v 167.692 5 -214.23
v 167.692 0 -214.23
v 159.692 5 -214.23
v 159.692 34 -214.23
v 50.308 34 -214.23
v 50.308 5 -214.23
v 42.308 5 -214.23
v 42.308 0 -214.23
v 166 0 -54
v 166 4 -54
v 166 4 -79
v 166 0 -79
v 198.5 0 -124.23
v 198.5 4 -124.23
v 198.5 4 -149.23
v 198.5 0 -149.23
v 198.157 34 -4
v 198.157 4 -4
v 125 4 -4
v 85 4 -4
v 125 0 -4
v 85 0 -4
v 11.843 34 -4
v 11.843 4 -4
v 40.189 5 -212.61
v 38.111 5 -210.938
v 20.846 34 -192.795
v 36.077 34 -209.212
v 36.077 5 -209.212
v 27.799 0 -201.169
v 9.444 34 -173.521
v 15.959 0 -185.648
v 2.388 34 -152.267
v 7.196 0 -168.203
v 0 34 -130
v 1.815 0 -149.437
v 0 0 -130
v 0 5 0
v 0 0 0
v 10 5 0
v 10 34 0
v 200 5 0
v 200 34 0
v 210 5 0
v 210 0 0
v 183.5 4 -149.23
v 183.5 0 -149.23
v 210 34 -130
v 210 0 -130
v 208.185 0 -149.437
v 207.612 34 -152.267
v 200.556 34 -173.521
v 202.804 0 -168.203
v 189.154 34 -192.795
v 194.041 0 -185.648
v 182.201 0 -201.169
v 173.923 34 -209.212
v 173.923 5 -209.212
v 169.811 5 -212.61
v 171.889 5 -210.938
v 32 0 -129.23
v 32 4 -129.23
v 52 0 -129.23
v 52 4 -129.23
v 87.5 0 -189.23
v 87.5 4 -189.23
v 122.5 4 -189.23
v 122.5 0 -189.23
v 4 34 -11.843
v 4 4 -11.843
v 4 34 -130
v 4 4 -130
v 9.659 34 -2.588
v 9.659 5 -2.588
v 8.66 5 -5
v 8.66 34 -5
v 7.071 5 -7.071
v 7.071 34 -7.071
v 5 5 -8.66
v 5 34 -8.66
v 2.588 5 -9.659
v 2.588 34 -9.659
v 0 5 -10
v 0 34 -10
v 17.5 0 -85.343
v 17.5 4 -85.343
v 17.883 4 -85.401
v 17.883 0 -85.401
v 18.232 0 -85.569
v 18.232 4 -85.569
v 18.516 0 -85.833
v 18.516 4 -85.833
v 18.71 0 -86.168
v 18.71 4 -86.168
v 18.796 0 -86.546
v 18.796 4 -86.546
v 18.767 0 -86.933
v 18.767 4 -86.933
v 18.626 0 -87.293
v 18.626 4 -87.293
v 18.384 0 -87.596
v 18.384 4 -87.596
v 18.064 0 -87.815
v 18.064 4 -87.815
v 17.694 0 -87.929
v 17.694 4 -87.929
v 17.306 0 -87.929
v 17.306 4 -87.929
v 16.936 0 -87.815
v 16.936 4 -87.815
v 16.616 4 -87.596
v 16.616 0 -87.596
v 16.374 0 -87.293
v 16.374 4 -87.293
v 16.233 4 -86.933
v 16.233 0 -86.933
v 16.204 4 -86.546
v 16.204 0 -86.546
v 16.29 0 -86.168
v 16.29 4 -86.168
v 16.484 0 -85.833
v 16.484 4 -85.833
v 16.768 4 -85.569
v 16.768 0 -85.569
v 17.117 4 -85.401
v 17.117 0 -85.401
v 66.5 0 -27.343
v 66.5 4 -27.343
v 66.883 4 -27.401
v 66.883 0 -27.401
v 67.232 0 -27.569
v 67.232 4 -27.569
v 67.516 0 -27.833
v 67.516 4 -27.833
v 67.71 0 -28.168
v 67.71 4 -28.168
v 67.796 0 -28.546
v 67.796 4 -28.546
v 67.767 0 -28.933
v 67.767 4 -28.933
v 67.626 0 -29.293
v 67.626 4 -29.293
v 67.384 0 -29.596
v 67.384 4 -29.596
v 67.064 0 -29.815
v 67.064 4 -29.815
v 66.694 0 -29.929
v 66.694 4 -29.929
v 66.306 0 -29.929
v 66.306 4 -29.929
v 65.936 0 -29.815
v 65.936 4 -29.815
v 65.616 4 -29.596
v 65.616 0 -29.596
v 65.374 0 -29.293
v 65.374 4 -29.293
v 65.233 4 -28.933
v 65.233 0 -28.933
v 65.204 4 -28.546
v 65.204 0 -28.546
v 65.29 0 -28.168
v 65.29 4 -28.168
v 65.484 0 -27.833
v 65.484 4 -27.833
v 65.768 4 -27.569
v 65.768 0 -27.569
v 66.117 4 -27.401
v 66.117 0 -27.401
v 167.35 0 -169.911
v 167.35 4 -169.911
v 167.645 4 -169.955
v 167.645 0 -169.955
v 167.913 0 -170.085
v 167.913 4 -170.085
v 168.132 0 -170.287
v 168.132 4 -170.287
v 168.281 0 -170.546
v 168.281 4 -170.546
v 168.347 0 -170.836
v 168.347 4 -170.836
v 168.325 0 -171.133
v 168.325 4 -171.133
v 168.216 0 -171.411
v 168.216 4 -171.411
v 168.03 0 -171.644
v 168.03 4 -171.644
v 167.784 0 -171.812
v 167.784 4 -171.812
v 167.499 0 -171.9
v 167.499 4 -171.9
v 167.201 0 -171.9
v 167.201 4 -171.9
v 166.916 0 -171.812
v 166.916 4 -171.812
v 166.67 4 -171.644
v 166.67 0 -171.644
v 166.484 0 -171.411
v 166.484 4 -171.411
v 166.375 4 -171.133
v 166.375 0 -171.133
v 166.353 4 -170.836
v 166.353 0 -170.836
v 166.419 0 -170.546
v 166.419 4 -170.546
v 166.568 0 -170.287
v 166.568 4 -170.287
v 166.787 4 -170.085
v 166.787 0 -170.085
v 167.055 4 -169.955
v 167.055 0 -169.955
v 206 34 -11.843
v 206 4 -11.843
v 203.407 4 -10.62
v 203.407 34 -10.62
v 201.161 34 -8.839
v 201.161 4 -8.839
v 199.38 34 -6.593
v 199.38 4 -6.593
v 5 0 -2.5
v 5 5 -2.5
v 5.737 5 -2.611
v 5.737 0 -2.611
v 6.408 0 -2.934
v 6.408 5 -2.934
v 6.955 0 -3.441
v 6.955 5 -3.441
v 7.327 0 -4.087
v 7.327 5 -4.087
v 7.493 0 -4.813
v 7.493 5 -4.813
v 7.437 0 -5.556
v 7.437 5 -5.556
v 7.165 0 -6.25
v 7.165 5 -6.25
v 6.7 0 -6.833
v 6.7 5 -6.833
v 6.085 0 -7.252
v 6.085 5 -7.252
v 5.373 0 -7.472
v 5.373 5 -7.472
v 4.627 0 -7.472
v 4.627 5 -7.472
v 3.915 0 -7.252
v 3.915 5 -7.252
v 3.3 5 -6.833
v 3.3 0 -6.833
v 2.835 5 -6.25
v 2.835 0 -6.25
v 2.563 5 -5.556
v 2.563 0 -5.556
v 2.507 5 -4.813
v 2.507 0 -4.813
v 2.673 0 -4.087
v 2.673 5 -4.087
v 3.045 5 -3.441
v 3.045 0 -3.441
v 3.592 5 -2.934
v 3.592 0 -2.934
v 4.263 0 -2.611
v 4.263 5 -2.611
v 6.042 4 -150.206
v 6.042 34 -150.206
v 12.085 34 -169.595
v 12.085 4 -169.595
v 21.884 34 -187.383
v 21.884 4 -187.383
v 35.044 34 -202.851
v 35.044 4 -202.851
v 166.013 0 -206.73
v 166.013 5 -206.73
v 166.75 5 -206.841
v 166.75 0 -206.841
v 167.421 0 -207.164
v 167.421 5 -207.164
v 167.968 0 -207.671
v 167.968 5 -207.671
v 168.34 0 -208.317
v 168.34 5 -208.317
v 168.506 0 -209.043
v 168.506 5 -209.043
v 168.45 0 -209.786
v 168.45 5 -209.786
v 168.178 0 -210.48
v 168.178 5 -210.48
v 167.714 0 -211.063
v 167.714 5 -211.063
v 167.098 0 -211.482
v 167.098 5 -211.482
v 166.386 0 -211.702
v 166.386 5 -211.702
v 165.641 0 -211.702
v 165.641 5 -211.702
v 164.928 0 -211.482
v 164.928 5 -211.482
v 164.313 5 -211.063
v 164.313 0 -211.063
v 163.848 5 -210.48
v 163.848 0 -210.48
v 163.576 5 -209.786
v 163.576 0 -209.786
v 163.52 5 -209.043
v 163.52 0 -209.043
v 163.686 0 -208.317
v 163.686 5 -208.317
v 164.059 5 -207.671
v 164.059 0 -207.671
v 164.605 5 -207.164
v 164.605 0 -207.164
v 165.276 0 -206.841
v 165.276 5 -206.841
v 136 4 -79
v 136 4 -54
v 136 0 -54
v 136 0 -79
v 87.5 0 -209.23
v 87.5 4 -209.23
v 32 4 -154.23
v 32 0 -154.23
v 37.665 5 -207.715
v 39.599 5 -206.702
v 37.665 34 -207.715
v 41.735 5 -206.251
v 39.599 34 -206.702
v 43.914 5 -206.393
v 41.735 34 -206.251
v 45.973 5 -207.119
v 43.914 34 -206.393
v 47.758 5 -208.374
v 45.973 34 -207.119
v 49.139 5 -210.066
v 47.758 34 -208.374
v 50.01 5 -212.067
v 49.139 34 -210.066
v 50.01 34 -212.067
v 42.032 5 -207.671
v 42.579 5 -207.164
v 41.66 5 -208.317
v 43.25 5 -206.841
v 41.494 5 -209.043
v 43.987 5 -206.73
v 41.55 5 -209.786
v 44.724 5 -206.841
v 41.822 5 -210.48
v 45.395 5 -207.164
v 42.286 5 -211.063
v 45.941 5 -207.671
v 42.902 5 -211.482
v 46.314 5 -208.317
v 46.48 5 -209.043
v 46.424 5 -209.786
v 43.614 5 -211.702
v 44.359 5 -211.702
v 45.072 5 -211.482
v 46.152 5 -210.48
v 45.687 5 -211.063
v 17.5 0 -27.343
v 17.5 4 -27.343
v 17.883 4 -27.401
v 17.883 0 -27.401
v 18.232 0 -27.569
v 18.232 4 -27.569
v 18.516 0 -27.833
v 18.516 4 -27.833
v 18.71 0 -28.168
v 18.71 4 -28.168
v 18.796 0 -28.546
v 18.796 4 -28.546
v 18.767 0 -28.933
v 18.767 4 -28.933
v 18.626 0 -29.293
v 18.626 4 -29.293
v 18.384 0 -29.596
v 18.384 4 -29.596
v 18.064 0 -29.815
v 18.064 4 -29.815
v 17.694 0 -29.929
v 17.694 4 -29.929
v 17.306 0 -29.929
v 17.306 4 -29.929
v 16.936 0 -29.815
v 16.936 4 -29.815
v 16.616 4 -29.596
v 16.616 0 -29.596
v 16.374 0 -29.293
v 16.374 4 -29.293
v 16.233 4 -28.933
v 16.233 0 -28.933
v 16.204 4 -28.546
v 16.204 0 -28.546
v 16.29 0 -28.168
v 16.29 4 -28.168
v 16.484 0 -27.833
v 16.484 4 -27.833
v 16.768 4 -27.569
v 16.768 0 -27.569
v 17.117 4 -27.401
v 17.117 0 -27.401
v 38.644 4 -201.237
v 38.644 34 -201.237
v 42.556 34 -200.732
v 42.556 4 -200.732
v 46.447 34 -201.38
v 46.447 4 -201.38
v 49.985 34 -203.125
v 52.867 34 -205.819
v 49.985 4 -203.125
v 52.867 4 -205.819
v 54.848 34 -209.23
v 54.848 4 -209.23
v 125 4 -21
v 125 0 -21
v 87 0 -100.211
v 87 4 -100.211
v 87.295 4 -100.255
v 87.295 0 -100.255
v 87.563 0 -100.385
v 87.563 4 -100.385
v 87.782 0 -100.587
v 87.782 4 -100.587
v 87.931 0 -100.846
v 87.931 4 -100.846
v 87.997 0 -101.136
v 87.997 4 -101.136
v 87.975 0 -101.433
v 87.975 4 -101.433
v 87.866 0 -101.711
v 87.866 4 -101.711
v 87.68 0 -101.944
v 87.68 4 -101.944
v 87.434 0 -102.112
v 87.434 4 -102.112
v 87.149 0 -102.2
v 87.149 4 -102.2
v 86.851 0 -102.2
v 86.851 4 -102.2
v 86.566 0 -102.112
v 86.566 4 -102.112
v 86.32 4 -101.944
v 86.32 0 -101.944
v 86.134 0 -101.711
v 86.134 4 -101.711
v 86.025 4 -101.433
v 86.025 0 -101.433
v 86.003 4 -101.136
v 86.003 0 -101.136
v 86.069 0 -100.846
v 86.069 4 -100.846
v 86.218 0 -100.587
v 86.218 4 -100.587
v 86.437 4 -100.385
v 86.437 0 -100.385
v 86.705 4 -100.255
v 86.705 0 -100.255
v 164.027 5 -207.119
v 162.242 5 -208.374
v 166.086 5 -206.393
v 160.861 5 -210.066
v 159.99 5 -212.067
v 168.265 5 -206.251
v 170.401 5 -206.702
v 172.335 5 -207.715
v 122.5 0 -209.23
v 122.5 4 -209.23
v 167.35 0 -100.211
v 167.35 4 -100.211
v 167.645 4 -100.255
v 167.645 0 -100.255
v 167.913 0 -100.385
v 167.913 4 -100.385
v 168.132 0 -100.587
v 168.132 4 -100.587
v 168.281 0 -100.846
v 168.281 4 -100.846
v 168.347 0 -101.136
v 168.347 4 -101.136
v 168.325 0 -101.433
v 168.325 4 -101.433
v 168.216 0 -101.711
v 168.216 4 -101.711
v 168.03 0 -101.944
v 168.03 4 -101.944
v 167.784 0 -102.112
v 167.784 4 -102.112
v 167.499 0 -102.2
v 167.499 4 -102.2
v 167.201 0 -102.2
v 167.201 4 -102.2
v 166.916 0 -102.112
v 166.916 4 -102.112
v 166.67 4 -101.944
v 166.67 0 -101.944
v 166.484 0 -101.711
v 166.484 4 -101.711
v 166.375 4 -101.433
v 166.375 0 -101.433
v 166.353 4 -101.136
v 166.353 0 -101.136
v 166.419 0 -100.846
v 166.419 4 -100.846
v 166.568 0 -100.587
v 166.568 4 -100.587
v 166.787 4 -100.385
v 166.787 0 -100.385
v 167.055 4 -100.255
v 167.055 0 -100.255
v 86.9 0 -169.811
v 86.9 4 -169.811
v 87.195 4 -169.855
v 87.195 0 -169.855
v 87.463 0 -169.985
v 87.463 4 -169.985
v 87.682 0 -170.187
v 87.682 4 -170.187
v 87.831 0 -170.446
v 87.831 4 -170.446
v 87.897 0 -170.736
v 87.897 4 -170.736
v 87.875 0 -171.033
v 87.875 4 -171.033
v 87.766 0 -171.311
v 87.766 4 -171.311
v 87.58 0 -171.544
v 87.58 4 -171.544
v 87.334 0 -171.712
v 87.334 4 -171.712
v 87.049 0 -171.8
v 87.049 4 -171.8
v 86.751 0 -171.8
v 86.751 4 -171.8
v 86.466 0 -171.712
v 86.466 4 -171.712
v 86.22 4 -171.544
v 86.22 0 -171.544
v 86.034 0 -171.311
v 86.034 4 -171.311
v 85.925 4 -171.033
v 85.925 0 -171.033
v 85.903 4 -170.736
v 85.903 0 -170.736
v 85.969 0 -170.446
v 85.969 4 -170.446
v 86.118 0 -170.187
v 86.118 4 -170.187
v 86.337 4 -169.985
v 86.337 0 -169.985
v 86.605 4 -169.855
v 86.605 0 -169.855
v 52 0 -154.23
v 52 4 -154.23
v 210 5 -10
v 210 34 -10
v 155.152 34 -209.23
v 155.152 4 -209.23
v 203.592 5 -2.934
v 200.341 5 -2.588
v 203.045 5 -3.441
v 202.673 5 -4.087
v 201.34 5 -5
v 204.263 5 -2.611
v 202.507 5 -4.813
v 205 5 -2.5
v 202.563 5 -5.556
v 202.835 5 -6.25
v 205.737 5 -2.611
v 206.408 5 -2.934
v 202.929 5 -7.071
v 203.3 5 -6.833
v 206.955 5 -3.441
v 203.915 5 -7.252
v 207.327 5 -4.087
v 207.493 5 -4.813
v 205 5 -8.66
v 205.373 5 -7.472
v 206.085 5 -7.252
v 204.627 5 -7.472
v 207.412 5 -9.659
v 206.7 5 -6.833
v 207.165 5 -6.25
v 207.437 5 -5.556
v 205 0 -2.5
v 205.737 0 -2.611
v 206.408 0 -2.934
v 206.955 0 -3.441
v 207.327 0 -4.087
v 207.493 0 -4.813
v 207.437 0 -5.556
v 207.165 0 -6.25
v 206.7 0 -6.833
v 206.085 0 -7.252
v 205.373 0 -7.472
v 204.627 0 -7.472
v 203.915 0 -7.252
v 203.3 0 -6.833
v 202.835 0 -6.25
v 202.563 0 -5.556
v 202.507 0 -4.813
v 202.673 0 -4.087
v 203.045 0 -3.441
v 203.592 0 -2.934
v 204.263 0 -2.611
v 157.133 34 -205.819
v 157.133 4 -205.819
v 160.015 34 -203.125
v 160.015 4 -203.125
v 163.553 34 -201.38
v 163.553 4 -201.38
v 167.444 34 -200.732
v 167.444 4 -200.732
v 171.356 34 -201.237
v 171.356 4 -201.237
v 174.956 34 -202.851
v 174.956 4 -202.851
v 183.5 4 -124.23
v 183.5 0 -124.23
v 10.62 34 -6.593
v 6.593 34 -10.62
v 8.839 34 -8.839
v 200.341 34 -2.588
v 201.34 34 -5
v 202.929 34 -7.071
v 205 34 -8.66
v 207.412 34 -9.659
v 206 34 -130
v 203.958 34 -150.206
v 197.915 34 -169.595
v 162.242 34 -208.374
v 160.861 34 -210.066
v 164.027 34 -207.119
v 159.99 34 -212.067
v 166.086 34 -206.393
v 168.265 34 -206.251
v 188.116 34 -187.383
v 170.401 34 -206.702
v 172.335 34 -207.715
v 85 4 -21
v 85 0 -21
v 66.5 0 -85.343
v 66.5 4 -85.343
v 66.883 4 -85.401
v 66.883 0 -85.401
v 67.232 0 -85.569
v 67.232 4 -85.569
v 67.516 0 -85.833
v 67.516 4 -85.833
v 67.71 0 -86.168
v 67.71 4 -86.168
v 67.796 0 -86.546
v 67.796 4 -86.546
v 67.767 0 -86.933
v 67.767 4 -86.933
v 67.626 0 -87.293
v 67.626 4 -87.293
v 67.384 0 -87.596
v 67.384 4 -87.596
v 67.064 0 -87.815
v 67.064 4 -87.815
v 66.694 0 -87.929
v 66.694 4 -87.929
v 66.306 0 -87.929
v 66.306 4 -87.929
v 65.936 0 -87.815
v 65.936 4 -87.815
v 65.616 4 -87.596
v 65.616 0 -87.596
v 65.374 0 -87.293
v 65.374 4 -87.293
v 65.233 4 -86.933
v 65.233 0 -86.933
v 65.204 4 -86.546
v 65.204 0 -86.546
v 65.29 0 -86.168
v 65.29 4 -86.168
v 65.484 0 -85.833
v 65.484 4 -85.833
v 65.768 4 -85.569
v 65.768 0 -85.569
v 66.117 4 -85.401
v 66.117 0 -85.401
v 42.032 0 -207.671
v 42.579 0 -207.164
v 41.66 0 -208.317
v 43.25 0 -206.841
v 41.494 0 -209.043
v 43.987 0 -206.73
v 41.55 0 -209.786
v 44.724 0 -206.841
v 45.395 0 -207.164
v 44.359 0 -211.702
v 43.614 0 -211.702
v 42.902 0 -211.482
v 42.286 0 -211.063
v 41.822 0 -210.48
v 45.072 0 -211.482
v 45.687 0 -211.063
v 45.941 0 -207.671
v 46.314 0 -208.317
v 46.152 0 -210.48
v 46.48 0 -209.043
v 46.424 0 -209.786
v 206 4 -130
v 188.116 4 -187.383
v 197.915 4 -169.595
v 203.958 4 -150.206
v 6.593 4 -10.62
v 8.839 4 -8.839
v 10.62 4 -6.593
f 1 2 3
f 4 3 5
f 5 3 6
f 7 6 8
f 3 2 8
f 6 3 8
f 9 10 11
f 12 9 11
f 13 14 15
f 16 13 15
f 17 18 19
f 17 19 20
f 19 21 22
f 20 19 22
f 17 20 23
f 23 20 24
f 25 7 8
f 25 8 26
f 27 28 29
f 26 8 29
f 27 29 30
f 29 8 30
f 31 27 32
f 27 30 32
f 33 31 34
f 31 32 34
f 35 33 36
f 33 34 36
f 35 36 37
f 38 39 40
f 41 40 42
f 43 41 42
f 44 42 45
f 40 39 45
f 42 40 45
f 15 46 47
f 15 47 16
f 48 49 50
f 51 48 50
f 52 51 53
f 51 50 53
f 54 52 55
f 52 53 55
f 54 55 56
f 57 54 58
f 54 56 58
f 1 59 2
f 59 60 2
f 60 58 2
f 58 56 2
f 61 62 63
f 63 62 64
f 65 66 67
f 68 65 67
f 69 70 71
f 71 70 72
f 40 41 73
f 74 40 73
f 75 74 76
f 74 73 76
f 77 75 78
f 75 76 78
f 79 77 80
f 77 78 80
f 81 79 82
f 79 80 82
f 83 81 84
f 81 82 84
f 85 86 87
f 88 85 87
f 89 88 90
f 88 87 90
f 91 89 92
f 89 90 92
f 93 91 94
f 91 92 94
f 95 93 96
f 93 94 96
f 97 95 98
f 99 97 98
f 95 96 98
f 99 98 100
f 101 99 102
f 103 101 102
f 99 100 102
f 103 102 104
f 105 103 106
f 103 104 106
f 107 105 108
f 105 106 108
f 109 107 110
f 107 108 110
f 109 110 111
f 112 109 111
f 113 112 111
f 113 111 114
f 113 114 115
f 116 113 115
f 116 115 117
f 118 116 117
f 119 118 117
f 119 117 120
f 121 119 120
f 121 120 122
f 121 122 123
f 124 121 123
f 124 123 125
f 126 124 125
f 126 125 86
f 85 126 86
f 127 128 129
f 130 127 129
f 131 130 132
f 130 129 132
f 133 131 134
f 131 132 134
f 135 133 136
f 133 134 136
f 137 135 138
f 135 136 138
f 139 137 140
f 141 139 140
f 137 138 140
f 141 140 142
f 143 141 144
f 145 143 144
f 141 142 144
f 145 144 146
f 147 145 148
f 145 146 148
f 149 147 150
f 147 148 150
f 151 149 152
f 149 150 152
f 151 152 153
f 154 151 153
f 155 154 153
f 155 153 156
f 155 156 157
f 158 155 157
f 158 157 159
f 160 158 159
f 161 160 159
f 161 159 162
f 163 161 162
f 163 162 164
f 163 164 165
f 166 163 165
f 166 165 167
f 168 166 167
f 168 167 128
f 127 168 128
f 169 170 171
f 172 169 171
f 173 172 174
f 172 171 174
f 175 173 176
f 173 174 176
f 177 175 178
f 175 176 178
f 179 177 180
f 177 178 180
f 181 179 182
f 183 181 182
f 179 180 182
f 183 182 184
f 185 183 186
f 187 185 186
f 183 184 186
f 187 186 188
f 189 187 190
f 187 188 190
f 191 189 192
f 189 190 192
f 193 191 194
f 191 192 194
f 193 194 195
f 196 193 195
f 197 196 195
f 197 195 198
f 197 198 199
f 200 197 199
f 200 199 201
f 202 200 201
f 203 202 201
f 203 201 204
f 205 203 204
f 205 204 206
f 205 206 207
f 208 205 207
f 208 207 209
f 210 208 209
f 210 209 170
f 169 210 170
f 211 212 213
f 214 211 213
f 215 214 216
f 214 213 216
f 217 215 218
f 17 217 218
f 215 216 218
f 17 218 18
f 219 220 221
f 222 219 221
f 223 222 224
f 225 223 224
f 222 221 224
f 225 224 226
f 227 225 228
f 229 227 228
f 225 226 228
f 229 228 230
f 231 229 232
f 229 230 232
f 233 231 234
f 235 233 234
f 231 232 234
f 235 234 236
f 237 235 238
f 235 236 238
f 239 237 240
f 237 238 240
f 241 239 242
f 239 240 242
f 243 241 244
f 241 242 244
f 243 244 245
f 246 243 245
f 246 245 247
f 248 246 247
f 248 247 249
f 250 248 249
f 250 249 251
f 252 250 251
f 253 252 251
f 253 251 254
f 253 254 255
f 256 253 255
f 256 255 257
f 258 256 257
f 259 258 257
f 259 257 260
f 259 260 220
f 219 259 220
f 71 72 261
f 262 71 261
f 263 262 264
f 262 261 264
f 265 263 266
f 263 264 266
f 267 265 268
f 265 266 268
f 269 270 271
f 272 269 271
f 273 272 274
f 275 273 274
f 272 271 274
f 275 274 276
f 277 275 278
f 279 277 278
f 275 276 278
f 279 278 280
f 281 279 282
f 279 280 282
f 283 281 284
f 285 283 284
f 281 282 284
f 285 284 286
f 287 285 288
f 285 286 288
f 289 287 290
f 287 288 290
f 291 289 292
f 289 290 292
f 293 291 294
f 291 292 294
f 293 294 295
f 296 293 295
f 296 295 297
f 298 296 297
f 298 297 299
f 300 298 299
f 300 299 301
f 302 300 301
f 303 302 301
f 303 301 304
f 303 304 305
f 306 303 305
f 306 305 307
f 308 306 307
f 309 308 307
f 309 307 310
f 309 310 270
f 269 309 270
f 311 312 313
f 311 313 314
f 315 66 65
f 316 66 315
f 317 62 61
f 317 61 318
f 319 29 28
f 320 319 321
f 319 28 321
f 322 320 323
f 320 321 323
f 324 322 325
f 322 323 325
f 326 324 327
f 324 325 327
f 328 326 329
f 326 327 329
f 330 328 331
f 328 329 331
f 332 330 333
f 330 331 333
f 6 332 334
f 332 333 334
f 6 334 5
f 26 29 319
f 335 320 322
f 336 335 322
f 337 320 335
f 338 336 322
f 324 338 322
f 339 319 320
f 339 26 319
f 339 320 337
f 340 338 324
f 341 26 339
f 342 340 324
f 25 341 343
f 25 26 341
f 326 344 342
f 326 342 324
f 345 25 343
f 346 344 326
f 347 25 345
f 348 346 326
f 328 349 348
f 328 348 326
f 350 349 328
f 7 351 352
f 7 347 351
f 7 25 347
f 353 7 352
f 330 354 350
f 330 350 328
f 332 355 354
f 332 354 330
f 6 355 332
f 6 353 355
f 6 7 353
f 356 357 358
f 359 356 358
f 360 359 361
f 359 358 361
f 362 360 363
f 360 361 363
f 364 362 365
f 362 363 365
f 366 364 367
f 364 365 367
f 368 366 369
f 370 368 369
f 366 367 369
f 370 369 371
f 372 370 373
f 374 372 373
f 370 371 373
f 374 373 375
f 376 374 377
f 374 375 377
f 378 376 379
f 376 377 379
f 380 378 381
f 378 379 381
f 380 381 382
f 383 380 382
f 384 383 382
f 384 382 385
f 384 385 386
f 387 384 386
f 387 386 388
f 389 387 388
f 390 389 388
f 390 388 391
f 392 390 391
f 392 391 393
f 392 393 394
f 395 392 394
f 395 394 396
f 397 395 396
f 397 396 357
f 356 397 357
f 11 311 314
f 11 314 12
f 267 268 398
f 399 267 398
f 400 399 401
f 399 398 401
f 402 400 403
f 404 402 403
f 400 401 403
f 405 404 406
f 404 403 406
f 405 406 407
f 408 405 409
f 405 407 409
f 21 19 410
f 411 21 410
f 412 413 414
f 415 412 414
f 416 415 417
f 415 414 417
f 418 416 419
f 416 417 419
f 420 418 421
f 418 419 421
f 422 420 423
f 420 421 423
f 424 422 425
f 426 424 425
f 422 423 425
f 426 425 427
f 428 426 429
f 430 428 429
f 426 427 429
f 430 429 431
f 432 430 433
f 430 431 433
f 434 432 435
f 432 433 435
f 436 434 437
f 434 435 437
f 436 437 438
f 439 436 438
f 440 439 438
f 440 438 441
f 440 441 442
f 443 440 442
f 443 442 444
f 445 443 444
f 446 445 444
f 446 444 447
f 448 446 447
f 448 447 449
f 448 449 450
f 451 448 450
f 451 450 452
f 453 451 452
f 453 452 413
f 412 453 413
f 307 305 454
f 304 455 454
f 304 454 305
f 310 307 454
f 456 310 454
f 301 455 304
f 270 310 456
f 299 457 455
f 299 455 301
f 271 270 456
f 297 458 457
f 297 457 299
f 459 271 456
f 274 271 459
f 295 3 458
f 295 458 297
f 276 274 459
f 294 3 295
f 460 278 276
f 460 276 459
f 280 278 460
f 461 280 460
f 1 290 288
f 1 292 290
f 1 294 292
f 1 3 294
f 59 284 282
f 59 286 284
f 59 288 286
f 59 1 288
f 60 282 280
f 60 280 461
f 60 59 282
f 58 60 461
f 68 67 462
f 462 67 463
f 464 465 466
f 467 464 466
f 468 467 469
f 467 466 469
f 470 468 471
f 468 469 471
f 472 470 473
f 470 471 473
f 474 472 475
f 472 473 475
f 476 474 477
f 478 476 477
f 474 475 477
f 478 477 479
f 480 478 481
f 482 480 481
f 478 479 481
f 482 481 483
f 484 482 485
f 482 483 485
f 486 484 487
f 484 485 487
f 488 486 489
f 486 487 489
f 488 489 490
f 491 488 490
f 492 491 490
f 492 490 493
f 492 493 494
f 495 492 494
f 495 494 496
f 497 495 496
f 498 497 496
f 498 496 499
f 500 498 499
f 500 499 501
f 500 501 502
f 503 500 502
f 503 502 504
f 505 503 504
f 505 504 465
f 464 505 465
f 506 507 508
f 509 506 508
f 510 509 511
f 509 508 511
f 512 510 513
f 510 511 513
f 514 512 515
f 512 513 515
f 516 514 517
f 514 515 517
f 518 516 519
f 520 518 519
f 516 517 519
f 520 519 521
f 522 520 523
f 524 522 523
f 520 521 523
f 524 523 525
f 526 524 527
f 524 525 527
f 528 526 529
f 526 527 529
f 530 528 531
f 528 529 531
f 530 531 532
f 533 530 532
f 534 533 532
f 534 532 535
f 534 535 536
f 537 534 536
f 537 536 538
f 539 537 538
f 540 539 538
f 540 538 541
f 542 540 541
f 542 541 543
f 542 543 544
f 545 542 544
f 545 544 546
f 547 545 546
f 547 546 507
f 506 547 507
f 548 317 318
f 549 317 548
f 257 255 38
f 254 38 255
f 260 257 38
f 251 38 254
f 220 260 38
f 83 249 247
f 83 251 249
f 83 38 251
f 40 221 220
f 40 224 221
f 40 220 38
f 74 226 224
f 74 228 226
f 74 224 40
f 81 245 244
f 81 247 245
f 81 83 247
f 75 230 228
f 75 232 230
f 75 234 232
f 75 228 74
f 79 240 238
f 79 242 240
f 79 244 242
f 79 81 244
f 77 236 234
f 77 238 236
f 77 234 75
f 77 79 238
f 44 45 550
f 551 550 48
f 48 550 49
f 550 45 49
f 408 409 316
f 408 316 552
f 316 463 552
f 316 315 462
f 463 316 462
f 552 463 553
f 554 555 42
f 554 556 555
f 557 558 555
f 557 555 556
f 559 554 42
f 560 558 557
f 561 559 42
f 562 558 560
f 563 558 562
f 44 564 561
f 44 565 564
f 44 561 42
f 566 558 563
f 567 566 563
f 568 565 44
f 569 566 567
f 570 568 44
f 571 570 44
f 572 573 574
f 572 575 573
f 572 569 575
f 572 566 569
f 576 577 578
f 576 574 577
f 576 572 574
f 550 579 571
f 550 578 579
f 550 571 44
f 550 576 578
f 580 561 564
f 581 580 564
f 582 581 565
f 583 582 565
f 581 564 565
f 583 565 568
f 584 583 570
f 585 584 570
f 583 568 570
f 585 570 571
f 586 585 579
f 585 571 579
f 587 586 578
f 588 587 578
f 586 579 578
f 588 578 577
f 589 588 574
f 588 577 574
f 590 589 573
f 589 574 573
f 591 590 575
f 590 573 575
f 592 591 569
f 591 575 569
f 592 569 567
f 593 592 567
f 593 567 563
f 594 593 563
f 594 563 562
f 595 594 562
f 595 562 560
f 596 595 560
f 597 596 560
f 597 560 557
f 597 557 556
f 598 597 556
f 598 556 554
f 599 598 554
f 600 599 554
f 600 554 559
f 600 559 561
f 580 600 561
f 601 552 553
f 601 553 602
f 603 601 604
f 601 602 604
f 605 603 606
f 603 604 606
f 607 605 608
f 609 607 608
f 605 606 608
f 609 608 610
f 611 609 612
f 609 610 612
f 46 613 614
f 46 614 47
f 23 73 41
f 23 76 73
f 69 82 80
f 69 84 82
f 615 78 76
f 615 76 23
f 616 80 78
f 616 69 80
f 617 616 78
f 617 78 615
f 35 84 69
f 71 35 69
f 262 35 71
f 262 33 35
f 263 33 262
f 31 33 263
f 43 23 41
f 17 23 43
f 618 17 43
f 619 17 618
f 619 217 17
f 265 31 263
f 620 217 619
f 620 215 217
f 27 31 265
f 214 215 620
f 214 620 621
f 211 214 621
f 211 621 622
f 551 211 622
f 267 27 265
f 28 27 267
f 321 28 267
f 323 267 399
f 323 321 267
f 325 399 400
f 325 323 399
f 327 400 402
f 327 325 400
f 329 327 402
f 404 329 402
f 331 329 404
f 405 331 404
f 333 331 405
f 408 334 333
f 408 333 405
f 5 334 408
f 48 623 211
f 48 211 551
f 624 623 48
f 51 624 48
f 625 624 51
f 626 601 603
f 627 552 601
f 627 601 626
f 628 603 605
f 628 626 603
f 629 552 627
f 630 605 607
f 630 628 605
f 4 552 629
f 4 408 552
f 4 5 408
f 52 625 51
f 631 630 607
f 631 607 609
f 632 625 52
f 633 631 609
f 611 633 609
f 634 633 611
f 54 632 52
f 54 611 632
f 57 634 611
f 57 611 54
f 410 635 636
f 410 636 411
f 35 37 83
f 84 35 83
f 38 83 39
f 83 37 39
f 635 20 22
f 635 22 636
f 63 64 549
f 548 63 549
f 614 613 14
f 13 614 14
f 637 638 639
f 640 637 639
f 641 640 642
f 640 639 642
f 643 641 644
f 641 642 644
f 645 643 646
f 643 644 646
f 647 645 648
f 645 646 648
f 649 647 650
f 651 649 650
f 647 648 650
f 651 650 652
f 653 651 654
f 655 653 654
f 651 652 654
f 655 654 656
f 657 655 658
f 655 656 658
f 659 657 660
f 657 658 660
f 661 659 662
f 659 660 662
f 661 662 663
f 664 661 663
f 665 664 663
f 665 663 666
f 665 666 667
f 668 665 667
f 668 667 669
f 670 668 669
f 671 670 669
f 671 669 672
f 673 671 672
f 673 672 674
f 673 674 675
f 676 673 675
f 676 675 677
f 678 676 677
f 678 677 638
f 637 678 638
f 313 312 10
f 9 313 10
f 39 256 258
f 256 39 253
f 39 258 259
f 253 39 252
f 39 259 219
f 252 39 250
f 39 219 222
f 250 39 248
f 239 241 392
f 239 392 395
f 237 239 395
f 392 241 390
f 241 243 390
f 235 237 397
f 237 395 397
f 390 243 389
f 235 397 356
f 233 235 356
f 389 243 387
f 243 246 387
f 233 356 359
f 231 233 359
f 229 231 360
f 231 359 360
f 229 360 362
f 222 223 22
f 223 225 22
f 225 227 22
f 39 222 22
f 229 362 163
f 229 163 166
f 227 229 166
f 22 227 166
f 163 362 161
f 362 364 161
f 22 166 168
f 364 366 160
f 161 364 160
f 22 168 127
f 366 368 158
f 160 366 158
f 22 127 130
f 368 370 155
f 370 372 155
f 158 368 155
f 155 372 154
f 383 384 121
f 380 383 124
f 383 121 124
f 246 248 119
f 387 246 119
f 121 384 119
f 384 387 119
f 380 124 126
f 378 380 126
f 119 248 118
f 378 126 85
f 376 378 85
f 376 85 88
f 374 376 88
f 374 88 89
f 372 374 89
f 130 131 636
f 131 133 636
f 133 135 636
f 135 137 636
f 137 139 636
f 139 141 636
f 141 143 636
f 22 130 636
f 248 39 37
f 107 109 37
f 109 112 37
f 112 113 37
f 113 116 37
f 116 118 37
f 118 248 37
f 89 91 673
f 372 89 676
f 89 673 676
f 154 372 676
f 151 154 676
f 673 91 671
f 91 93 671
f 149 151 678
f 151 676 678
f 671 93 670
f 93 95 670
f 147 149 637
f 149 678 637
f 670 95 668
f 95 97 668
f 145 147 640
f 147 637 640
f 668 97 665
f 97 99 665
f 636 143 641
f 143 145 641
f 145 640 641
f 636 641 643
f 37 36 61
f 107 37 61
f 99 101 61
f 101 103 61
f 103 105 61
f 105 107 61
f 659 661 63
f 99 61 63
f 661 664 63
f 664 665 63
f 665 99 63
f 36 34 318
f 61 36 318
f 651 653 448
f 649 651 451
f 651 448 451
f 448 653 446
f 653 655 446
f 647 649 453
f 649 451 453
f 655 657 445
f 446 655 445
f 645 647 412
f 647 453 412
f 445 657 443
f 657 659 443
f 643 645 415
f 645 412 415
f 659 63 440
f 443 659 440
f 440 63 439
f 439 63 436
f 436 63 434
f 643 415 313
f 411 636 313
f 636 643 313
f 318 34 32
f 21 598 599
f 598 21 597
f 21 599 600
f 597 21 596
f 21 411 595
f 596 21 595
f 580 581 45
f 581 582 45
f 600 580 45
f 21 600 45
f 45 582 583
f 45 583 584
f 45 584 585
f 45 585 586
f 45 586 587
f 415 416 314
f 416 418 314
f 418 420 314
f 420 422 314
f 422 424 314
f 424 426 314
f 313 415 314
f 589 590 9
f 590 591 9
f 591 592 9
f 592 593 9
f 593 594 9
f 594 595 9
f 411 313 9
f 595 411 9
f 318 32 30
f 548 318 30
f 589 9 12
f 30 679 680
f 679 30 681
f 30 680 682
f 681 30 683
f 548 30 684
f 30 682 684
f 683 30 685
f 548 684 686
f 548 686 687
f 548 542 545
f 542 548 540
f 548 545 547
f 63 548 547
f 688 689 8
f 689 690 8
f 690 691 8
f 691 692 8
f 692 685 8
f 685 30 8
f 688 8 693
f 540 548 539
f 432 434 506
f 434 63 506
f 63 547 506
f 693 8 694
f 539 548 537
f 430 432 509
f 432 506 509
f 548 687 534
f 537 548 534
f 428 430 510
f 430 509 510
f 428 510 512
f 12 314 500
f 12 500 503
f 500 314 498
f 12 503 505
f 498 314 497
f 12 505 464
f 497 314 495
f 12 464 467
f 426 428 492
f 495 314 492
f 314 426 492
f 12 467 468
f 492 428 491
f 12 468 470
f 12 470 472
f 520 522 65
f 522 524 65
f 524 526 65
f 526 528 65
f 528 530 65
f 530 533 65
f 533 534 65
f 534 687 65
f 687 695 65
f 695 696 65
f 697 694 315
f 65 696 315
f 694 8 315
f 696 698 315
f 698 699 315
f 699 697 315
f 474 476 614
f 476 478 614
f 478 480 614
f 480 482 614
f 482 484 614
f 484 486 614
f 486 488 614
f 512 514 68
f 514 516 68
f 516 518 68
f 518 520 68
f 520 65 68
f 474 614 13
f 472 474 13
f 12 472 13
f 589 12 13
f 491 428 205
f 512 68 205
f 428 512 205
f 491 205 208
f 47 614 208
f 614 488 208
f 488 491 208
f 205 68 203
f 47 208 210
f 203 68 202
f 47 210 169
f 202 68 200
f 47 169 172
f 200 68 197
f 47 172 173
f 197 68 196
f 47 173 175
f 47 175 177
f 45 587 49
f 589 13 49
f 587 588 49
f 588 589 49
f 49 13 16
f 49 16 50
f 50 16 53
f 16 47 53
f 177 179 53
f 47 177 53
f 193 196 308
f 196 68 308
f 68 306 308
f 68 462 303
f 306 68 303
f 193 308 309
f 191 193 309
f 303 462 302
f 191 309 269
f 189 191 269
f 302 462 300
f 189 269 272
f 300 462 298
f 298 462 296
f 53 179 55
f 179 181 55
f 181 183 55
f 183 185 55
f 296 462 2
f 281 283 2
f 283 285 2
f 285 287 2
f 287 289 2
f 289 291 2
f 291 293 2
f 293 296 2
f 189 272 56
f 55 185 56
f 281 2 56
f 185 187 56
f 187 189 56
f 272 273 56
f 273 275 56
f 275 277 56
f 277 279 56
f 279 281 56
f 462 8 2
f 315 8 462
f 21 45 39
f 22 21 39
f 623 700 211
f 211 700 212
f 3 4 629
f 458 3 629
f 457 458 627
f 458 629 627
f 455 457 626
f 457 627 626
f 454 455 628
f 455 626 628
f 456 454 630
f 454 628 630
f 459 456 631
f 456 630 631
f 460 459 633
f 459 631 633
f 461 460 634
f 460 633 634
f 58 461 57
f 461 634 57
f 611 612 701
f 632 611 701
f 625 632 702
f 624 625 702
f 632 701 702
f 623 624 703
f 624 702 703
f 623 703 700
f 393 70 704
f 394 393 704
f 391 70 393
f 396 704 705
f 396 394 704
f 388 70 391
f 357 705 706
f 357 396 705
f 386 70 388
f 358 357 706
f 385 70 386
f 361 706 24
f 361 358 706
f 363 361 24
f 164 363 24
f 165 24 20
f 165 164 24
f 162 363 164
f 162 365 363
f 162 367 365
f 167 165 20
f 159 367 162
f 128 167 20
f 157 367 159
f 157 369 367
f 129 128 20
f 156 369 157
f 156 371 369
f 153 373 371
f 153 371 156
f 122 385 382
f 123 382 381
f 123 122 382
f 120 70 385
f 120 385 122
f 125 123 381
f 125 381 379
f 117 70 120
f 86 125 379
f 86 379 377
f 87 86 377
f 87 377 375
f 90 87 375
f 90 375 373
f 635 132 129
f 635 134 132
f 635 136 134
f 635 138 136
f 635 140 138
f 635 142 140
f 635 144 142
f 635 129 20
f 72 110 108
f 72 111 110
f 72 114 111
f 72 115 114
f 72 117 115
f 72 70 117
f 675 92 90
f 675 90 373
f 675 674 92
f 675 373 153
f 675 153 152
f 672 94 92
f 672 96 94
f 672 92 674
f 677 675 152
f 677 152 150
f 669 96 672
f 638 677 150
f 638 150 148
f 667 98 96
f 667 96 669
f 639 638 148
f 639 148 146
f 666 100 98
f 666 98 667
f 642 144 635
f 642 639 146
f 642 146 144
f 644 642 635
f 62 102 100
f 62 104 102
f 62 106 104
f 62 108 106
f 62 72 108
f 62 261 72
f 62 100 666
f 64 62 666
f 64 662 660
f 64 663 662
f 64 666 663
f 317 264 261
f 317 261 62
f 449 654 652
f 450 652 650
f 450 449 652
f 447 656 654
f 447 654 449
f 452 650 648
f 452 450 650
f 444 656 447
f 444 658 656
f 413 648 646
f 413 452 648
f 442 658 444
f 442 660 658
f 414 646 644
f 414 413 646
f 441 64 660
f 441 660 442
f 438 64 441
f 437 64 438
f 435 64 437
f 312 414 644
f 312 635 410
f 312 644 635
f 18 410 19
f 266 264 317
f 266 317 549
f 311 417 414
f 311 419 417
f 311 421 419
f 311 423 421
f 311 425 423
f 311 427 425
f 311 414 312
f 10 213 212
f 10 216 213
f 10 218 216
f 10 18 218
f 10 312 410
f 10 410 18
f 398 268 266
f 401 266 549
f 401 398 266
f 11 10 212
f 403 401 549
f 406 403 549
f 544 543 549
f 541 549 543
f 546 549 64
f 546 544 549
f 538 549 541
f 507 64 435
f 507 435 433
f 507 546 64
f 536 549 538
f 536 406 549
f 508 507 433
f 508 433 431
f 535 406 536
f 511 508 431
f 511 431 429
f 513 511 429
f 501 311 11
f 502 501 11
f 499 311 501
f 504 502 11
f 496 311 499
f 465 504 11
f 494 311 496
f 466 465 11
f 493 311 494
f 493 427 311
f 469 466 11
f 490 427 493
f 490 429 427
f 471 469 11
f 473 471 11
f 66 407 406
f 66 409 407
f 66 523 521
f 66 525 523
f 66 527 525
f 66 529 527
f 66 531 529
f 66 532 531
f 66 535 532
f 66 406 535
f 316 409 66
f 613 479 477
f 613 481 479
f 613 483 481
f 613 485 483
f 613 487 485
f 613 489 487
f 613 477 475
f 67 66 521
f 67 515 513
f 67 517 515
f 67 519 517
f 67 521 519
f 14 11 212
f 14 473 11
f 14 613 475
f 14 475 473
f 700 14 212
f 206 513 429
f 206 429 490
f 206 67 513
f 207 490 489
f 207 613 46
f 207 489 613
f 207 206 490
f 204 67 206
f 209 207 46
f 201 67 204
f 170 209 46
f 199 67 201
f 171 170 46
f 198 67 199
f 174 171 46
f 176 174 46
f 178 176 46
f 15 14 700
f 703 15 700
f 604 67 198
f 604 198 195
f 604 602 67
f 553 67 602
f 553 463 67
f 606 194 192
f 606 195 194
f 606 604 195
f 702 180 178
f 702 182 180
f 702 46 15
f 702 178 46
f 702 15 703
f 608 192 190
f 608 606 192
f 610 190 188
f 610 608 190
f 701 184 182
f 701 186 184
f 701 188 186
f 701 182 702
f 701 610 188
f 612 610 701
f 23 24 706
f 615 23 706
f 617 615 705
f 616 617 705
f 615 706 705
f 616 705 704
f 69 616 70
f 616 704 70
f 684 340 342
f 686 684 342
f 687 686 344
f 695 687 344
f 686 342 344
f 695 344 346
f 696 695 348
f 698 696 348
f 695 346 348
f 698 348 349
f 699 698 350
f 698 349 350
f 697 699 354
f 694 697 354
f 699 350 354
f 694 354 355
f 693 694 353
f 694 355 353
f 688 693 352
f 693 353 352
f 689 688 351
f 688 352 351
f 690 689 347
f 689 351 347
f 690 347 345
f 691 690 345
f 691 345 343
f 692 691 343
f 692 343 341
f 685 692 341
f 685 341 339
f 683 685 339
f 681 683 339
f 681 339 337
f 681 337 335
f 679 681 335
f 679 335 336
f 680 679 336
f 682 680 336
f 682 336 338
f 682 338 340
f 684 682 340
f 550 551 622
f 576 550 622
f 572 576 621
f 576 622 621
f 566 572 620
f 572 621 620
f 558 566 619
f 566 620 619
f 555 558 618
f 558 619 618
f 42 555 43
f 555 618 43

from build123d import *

# Parameters (mm, degrees)
BOSS_EXTRUDE1_DEPTH = 4
BOSS_EXTRUDE2_DEPTH = 30
SKETCH3_W           = 218.358496247
SKETCH3_H           = 47.347449782
CUT_EXTRUDE1_DEPTH  = 317.987381452
BOSS_EXTRUDE3_START = -30
BOSS_EXTRUDE3_DEPTH = 30
BOSS_EXTRUDE4_START = -30
BOSS_EXTRUDE4_DEPTH = 30
CUT_EXTRUDE2_REACH  = 303.911
SKETCH6_R           = 2.5
SKETCH7_R           = 8
CUT_EXTRUDE3_DEPTH  = 29
BOSS_EXTRUDE5_START = -30
BOSS_EXTRUDE5_DEPTH = 30
SKETCH9_R           = 2.5
CUT_EXTRUDE4_DEPTH  = 302.911399089
SKETCH10_R          = 10
CUT_EXTRUDE5_DEPTH  = 29
SKETCH11_W          = 40
SKETCH11_H          = 17
CUT_EXTRUDE6_DEPTH  = 32
SKETCH14_R          = 1.3
CUT_EXTRUDE9_DEPTH  = 10
SKETCH12_R          = 1
CUT_EXTRUDE10_DEPTH = 302.487135546
SKETCH16_W          = 35
SKETCH16_H          = 20
SKETCH16_W_2        = 20
SKETCH16_H_2        = 25
SKETCH16_W_3        = 30
SKETCH16_W_4        = 15
CUT_EXTRUDE11_DEPTH = 302.487135546


# Read off the part's stored shape, not the designer's step: Boss-Extrude3, Boss-Extrude4, Boss-Extrude5
with BuildPart() as part:
    # Sketch1 → Boss-Extrude1 (new body)
    with BuildSketch(Plane(origin=(0, 0, 0), x_dir=(1, 0, 0), z_dir=(0, 1, 0))):
        with BuildLine():
            ThreePointArc((210, 130), (105, 235), (0, 130))
            Line((0, 130), (210, 130))
        make_face()
        with BuildLine():
            Line((210, 130), (0, 130))
            ThreePointArc((0, 130), (105, 25), (210, 130))
        make_face()
        with BuildLine():
            Line((0, 130), (0, 0))
            Line((0, 0), (210, 0))
            Line((210, 0), (210, 130))
            ThreePointArc((210, 130), (105, 25), (0, 130))
        make_face()
    extrude(amount=BOSS_EXTRUDE1_DEPTH)

    # Sketch2 → Boss-Extrude2 (add)
    with BuildSketch(Plane(origin=(0, 4, 0), x_dir=(1, 0, 0), z_dir=(0, 1, 0))):
        with BuildLine():
            Line((210, 0), (210, 130))
            ThreePointArc((210, 130), (105, 235), (0, 130))
            Line((0, 130), (0, 0))
            Line((0, 0), (210, 0))
        make_face()
        with BuildLine():
            ThreePointArc((4, 130), (105, 231), (206, 130))
            Line((206, 130), (206, 4))
            Line((206, 4), (4, 4))
            Line((4, 4), (4, 130))
        make_face(mode=Mode.SUBTRACT)
    extrude(amount=BOSS_EXTRUDE2_DEPTH)

    # Sketch3 → Cut-Extrude1 (cut, through all)
    with BuildSketch(Plane(origin=(0, 34, 0), x_dir=(1, 0, 0), z_dir=(0, 1, 0))):
        with Locations((109.179248124, 237.903724891)):
            Rectangle(SKETCH3_W, SKETCH3_H)
    extrude(amount=-CUT_EXTRUDE1_DEPTH, mode=Mode.SUBTRACT)

    # Boss-Extrude3 outline → Boss-Extrude3 (add)
    with BuildSketch(Plane(origin=(0, 34, 0), x_dir=(1, 0, 0), z_dir=(0, 1, 0)).offset(BOSS_EXTRUDE3_START)):
        with BuildLine():
            Line((160.734254279, 214.23), (49.265745721, 214.23))
            ThreePointArc((49.265745721, 214.23), (45.760745723, 211.802877411), (42.361297108, 209.23))
            Line((42.361297108, 209.23), (167.638702892, 209.23))
            ThreePointArc((167.638702892, 209.23), (164.239254277, 211.802877411), (160.734254279, 214.23))
        make_face()
    extrude(amount=BOSS_EXTRUDE3_DEPTH)

    # Boss-Extrude4 outline → Boss-Extrude4 (add)
    with BuildSketch(Plane(origin=(0, 34, 0), x_dir=(1, 0, 0), z_dir=(0, 1, 0)).offset(BOSS_EXTRUDE4_START)):
        with BuildLine():
            ThreePointArc((42.361297108, 209.23), (38.626128036, 206.128241281), (35.044335216, 202.850565986))
            ThreePointArc((35.044335216, 202.850565986), (46.447220251, 201.380271613), (54.847774812, 209.23))
            Line((54.847774812, 209.23), (42.361297108, 209.23))
        make_face()
        with BuildLine():
            Line((167.638702892, 209.23), (155.152225188, 209.23))
            ThreePointArc((155.152225188, 209.23), (163.552779749, 201.380271613), (174.955664785, 202.850565987))
            ThreePointArc((174.955664785, 202.850565987), (171.373871964, 206.128241281), (167.638702892, 209.23))
        make_face()
    extrude(amount=BOSS_EXTRUDE4_DEPTH)

    # Sketch6 → Cut-Extrude2 (cut, up to next)
    with BuildSketch(Plane(origin=(0, 34, 0), x_dir=(1, 0, 0), z_dir=(0, 1, 0)), mode=Mode.PRIVATE) as cut_extrude2_sk1:
        with Locations(Location((43.986828471, 209.23, 0), (0, 0, 270))):
            Circle(SKETCH6_R)
    cut_extrude2_tool1 = extrude(cut_extrude2_sk1.sketch, amount=-CUT_EXTRUDE2_REACH, mode=Mode.PRIVATE) & part.part
    # Sketch6 → Cut-Extrude2 (cut, up to next)
    with BuildSketch(Plane(origin=(0, 34, 0), x_dir=(1, 0, 0), z_dir=(0, 1, 0)), mode=Mode.PRIVATE) as cut_extrude2_sk2:
        with Locations(Location((166.013171529, 209.23, 0), (0, 0, 270))):
            Circle(SKETCH6_R)
    cut_extrude2_tool2 = extrude(cut_extrude2_sk2.sketch, amount=-CUT_EXTRUDE2_REACH, mode=Mode.PRIVATE) & part.part
    add(cut_extrude2_tool1.solids().sort_by_distance((43.986828, 34, -209.23))[0], mode=Mode.SUBTRACT)
    add(cut_extrude2_tool2.solids().sort_by_distance((166.013172, 34, -209.23))[0], mode=Mode.SUBTRACT)

    # Sketch7 → Cut-Extrude3 (cut)
    with BuildSketch(Plane(origin=(0, 34, 0), x_dir=(1, 0, 0), z_dir=(0, 1, 0))):
        with Locations((42.307838608, 214.23)):
            Circle(SKETCH7_R)
        with Locations((167.692161392, 214.23)):
            Circle(SKETCH7_R)
    extrude(amount=-CUT_EXTRUDE3_DEPTH, mode=Mode.SUBTRACT)

    # Boss-Extrude5 outline → Boss-Extrude5 (add)
    with BuildSketch(Plane(origin=(0, 34, 0), x_dir=(1, 0, 0), z_dir=(0, 1, 0)).offset(BOSS_EXTRUDE5_START)):
        with BuildLine():
            Line((4, 4), (11.842719282, 4))
            ThreePointArc((11.842719282, 4), (8.838834765, 8.838834765), (4, 11.842719282))
            Line((4, 11.842719282), (4, 4))
        make_face()
        with BuildLine():
            ThreePointArc((206, 11.842719282), (201.161165235, 8.838834765), (198.157280718, 4))
            Line((198.157280718, 4), (206, 4))
            Line((206, 4), (206, 11.842719282))
        make_face()
    extrude(amount=BOSS_EXTRUDE5_DEPTH)

    # Sketch9 → Cut-Extrude4 (cut, through all)
    with BuildSketch(Plane(origin=(0, 34, 0), x_dir=(1, 0, 0), z_dir=(0, 1, 0))):
        with Locations(Location((5, 5, 0), (0, 0, 270))):
            Circle(SKETCH9_R)
        with Locations(Location((205, 5, 0), (0, 0, 270))):
            Circle(SKETCH9_R)
    extrude(amount=-CUT_EXTRUDE4_DEPTH, mode=Mode.SUBTRACT)

    # Sketch10 → Cut-Extrude5 (cut)
    with BuildSketch(Plane(origin=(0, 34, 0), x_dir=(1, 0, 0), z_dir=(0, 1, 0))):
        Circle(SKETCH10_R)
        with Locations((210, 0)):
            Circle(SKETCH10_R)
    extrude(amount=-CUT_EXTRUDE5_DEPTH, mode=Mode.SUBTRACT)

    # Sketch11 → Cut-Extrude6 (cut)
    with BuildSketch(Plane(origin=(0, 4, 0), x_dir=(1, 0, 0), z_dir=(0, 1, 0))):
        with Locations((105, 12.5)):
            Rectangle(SKETCH11_W, SKETCH11_H)
    extrude(amount=-CUT_EXTRUDE6_DEPTH, mode=Mode.SUBTRACT)

    # Sketch14 → Cut-Extrude9 (cut)
    with BuildSketch(Plane(origin=(0, 4, 0), x_dir=(1, 0, 0), z_dir=(0, 1, 0))):
        with Locations(Location((17.5, 86.643431732, 0), (0, 0, 270))):
            Circle(SKETCH14_R)
        with Locations(Location((66.5, 86.643431732, 0), (0, 0, 270))):
            Circle(SKETCH14_R)
        with Locations(Location((17.5, 28.643431732, 0), (0, 0, 270))):
            Circle(SKETCH14_R)
        with Locations(Location((66.5, 28.643431732, 0), (0, 0, 270))):
            Circle(SKETCH14_R)
    extrude(amount=-CUT_EXTRUDE9_DEPTH, mode=Mode.SUBTRACT)

    # Sketch12 → Cut-Extrude10 (cut, through all)
    with BuildSketch(Plane(origin=(0, 4, 0), x_dir=(1, 0, 0), z_dir=(0, 1, 0))):
        with Locations(Location((86.9, 170.810842956, 0), (0, 0, 270))):
            Circle(SKETCH12_R)
        with Locations(Location((167.35, 101.210842956, 0), (0, 0, 270))):
            Circle(SKETCH12_R)
        with Locations(Location((167.35, 170.910842956, 0), (0, 0, 270))):
            Circle(SKETCH12_R)
        with Locations(Location((87, 101.210842956, 0), (0, 0, 270))):
            Circle(SKETCH12_R)
    extrude(amount=-CUT_EXTRUDE10_DEPTH, mode=Mode.SUBTRACT)

    # Sketch16 → Cut-Extrude11 (cut, through all)
    with BuildSketch(Plane(origin=(0, 4, 0), x_dir=(1, 0, 0), z_dir=(0, 1, 0))):
        with Locations((105, 199.23)):
            Rectangle(SKETCH16_W, SKETCH16_H)
        with Locations((42, 141.73)):
            Rectangle(SKETCH16_W_2, SKETCH16_H_2)
        with Locations((151, 66.5)):
            Rectangle(SKETCH16_W_3, SKETCH16_H_2)
        with Locations((191, 136.73)):
            Rectangle(SKETCH16_W_4, SKETCH16_H_2)
    extrude(amount=-CUT_EXTRUDE11_DEPTH, mode=Mode.SUBTRACT)


solid = part.part
